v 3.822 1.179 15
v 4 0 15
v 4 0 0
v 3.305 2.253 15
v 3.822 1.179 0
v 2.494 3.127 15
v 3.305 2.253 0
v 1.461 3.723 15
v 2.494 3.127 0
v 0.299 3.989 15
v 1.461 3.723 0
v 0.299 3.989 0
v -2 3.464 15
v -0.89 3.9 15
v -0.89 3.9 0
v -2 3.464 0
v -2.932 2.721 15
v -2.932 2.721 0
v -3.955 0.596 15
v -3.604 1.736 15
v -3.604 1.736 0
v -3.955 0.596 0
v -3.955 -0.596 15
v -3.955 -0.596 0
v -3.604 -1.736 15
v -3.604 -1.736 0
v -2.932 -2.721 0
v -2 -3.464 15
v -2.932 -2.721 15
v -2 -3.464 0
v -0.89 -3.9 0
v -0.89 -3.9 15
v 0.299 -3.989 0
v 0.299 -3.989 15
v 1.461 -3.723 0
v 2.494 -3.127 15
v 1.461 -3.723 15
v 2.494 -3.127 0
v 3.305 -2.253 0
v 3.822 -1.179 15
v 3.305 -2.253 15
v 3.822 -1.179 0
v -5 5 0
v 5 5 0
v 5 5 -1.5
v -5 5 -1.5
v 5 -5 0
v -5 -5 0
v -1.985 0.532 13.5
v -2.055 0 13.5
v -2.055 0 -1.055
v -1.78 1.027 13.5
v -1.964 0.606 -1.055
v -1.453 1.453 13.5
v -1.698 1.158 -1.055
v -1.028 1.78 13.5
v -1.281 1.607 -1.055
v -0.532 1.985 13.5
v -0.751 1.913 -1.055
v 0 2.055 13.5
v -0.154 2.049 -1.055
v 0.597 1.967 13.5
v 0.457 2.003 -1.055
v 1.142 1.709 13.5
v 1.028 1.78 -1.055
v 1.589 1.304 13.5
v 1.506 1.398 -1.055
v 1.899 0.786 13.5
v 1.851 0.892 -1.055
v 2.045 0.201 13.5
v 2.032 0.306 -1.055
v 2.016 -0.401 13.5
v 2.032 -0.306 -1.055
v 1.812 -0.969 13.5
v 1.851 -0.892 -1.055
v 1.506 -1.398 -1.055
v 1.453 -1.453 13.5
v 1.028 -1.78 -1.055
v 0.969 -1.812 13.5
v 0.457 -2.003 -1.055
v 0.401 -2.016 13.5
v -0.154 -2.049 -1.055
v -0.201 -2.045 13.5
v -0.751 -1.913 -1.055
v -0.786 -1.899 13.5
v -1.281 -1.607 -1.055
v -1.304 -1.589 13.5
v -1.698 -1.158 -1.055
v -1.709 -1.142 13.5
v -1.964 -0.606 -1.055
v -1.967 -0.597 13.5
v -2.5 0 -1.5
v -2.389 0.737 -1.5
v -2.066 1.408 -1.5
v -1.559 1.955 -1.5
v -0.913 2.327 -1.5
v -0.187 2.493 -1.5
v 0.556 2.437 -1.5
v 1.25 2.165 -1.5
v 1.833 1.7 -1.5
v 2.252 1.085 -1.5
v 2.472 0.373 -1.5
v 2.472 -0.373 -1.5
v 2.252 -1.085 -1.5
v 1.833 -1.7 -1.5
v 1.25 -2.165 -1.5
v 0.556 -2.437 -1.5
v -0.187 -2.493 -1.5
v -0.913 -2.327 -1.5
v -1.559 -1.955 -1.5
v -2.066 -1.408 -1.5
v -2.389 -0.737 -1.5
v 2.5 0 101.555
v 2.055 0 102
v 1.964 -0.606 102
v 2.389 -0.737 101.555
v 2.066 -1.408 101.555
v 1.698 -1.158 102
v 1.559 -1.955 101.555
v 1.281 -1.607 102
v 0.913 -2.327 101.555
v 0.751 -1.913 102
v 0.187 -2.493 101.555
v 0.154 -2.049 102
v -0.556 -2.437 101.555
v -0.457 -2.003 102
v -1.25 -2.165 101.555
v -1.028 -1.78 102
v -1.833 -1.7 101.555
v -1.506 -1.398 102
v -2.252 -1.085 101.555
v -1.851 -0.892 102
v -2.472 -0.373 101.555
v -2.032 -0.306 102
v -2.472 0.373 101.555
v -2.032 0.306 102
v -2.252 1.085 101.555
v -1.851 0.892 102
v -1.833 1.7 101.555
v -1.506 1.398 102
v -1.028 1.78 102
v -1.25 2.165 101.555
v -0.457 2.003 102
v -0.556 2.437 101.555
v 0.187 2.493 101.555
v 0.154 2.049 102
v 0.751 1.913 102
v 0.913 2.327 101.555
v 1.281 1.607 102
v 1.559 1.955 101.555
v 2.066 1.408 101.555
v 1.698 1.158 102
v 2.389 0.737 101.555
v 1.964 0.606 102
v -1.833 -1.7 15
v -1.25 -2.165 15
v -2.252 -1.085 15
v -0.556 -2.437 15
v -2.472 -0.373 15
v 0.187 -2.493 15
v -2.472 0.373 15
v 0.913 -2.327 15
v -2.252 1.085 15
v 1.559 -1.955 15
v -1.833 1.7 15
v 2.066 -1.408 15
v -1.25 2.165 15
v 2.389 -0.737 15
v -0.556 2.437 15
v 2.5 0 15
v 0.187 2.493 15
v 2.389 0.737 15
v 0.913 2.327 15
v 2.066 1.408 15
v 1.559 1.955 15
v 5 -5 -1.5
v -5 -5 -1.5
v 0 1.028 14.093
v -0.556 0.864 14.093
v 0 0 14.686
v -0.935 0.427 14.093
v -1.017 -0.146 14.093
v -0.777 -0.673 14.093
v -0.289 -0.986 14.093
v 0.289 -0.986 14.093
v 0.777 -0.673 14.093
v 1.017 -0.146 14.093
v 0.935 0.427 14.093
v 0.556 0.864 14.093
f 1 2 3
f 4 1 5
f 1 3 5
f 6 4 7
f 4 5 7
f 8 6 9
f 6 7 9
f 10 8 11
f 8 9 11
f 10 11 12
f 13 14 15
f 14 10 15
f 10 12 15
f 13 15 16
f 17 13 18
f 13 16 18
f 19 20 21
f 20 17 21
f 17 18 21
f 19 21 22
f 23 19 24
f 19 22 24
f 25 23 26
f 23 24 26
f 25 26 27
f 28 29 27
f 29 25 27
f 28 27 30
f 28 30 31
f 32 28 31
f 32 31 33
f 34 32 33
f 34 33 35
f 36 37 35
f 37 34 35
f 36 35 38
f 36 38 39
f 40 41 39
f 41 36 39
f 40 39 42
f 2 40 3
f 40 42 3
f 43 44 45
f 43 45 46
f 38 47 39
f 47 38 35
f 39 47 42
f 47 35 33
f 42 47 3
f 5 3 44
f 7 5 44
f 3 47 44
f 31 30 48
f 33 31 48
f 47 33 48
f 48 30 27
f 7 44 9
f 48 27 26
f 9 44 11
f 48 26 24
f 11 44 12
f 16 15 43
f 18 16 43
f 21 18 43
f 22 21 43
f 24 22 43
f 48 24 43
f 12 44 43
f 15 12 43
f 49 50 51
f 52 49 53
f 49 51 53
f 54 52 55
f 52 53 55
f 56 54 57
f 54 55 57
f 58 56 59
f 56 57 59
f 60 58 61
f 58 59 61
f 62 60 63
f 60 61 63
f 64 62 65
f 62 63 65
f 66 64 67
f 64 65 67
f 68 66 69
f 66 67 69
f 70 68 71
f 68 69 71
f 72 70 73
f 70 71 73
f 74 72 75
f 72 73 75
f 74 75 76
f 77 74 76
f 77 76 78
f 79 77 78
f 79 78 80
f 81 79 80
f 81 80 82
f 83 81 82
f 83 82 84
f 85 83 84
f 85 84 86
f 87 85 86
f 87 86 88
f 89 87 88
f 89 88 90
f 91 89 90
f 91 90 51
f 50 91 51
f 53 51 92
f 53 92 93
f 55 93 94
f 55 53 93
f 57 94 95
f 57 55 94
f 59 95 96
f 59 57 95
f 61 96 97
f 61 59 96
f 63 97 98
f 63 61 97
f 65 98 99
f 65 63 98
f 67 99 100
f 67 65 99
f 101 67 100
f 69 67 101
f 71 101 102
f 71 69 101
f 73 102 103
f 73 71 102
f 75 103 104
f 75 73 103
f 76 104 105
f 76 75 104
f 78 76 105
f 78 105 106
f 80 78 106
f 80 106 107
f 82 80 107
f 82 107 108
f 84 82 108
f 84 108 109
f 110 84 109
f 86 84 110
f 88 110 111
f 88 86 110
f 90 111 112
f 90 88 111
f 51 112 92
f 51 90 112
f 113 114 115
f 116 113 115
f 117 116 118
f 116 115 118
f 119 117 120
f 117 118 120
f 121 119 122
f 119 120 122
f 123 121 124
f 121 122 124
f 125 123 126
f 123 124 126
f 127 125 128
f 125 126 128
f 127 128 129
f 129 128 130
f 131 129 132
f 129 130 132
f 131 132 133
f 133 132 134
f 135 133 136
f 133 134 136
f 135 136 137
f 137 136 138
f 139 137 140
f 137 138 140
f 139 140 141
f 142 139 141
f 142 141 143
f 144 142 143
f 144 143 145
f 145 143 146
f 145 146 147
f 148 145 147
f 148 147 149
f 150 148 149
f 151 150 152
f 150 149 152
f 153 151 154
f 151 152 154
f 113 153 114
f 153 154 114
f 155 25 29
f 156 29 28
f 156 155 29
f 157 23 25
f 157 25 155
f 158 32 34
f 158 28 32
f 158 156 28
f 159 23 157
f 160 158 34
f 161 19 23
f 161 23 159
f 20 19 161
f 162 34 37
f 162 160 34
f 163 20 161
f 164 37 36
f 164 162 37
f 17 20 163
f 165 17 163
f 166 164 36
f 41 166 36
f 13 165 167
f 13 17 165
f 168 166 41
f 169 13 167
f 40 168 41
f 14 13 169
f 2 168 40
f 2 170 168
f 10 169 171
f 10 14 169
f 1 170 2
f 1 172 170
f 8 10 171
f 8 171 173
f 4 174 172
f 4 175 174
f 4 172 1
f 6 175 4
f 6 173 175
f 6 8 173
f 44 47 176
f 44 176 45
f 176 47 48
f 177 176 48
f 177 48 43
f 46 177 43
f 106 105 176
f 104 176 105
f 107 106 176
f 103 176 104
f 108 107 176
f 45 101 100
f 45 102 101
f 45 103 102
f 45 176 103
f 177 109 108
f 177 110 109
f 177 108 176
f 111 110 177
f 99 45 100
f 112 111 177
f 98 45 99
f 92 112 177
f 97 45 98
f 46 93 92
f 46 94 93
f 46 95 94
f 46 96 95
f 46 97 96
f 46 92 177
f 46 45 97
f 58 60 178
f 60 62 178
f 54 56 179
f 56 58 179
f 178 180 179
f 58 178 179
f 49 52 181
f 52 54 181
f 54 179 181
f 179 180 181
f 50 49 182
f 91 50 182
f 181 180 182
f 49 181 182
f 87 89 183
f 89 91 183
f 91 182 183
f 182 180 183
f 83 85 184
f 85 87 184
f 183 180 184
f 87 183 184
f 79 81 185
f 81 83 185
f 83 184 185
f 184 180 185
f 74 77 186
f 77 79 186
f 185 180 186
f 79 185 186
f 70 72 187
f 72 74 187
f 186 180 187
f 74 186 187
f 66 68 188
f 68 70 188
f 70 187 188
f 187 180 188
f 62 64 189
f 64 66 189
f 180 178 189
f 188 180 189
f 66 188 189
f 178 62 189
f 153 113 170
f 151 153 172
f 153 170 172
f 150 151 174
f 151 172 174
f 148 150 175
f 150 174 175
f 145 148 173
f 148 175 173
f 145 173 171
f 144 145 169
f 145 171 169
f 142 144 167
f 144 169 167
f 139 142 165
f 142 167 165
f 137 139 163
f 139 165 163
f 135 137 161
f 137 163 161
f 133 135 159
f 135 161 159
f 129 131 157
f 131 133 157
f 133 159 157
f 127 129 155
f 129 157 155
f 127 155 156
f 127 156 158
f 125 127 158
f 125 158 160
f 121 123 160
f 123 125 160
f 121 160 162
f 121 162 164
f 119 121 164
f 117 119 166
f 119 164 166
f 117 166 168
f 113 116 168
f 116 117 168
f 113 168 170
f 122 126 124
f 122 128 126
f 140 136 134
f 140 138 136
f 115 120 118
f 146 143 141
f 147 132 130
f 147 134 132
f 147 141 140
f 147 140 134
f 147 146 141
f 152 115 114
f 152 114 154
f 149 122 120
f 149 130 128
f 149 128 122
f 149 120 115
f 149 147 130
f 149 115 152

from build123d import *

# Parameters (mm, degrees)
SKETCH_1_R          = 4
EXTRUDE_1_DEPTH     = 102
SKETCH_2_W          = 10
SKETCH_2_H          = 10
EXTRUDE_2_DEPTH     = 1.5
SKETCH_6_R          = 2.055
CUT_EXTRUDE_1_DEPTH = 15
CHAMFER_1_SIZE      = 0.445
CUT_EXTRUDE_START   = 15
SKETCH_9_R          = 10
SKETCH_9_R_2        = 2.5
CUT_EXTRUDE_3_DEPTH = 88.244804269
CHAMFER1_SIZE       = 0.445


with BuildPart() as part:
    # Эскиз1 → Бобышка-Вытянуть1 (new body)
    with BuildSketch(Plane.XY):
        Circle(SKETCH_1_R)
    extrude(amount=EXTRUDE_1_DEPTH)

    # Эскиз2 → Бобышка-Вытянуть2 (add)
    with BuildSketch(Plane(origin=(0, 0, 0), x_dir=(-1, 0, 0), z_dir=(0, 0, -1))):
        Rectangle(SKETCH_2_W, SKETCH_2_H)
    extrude(amount=EXTRUDE_2_DEPTH)

    # Эскиз6 → Вырез-Вытянуть1 (cut)
    with BuildSketch(Plane(origin=(0, 0, -1.5), x_dir=(-1, 0, 0), z_dir=(0, 0, -1))):
        Circle(SKETCH_6_R)
    extrude(amount=-CUT_EXTRUDE_1_DEPTH, mode=Mode.SUBTRACT)

    # Вырез-Вытянуть2 cone 1 section (through the dimple's axis) → Вырез-Вытянуть2 (revolve, cut)
    with BuildSketch(Plane(origin=(0, 0, 13.5), x_dir=(0, 1, 0), z_dir=(1, 0, 0))):
        Polygon((0, 0), (2.055, 0), (0, 1.186454803), align=None)
    revolve(axis=Axis((0, 0, 13.5), (0, 0, 1)), mode=Mode.SUBTRACT)

    # Фаска1
    chamfer_1_edges = [part.edges().sort_by_distance(p)[0] for p in [
        (2.055, 0, -1.5),
    ]]
    chamfer(chamfer_1_edges, length=CHAMFER_1_SIZE)

    # Эскиз9 → Вырез-Вытянуть3 (cut, through all)
    with BuildSketch(Plane.XY.offset(CUT_EXTRUDE_START)):
        Circle(SKETCH_9_R)
        Circle(SKETCH_9_R_2, mode=Mode.SUBTRACT)
    extrude(amount=CUT_EXTRUDE_3_DEPTH, mode=Mode.SUBTRACT)

    # Chamfer1
    chamfer1_edges = [part.edges().sort_by_distance(p)[0] for p in [
        (-2.5, 0, 102),
    ]]
    chamfer(chamfer1_edges, length=CHAMFER1_SIZE)


solid = part.part
